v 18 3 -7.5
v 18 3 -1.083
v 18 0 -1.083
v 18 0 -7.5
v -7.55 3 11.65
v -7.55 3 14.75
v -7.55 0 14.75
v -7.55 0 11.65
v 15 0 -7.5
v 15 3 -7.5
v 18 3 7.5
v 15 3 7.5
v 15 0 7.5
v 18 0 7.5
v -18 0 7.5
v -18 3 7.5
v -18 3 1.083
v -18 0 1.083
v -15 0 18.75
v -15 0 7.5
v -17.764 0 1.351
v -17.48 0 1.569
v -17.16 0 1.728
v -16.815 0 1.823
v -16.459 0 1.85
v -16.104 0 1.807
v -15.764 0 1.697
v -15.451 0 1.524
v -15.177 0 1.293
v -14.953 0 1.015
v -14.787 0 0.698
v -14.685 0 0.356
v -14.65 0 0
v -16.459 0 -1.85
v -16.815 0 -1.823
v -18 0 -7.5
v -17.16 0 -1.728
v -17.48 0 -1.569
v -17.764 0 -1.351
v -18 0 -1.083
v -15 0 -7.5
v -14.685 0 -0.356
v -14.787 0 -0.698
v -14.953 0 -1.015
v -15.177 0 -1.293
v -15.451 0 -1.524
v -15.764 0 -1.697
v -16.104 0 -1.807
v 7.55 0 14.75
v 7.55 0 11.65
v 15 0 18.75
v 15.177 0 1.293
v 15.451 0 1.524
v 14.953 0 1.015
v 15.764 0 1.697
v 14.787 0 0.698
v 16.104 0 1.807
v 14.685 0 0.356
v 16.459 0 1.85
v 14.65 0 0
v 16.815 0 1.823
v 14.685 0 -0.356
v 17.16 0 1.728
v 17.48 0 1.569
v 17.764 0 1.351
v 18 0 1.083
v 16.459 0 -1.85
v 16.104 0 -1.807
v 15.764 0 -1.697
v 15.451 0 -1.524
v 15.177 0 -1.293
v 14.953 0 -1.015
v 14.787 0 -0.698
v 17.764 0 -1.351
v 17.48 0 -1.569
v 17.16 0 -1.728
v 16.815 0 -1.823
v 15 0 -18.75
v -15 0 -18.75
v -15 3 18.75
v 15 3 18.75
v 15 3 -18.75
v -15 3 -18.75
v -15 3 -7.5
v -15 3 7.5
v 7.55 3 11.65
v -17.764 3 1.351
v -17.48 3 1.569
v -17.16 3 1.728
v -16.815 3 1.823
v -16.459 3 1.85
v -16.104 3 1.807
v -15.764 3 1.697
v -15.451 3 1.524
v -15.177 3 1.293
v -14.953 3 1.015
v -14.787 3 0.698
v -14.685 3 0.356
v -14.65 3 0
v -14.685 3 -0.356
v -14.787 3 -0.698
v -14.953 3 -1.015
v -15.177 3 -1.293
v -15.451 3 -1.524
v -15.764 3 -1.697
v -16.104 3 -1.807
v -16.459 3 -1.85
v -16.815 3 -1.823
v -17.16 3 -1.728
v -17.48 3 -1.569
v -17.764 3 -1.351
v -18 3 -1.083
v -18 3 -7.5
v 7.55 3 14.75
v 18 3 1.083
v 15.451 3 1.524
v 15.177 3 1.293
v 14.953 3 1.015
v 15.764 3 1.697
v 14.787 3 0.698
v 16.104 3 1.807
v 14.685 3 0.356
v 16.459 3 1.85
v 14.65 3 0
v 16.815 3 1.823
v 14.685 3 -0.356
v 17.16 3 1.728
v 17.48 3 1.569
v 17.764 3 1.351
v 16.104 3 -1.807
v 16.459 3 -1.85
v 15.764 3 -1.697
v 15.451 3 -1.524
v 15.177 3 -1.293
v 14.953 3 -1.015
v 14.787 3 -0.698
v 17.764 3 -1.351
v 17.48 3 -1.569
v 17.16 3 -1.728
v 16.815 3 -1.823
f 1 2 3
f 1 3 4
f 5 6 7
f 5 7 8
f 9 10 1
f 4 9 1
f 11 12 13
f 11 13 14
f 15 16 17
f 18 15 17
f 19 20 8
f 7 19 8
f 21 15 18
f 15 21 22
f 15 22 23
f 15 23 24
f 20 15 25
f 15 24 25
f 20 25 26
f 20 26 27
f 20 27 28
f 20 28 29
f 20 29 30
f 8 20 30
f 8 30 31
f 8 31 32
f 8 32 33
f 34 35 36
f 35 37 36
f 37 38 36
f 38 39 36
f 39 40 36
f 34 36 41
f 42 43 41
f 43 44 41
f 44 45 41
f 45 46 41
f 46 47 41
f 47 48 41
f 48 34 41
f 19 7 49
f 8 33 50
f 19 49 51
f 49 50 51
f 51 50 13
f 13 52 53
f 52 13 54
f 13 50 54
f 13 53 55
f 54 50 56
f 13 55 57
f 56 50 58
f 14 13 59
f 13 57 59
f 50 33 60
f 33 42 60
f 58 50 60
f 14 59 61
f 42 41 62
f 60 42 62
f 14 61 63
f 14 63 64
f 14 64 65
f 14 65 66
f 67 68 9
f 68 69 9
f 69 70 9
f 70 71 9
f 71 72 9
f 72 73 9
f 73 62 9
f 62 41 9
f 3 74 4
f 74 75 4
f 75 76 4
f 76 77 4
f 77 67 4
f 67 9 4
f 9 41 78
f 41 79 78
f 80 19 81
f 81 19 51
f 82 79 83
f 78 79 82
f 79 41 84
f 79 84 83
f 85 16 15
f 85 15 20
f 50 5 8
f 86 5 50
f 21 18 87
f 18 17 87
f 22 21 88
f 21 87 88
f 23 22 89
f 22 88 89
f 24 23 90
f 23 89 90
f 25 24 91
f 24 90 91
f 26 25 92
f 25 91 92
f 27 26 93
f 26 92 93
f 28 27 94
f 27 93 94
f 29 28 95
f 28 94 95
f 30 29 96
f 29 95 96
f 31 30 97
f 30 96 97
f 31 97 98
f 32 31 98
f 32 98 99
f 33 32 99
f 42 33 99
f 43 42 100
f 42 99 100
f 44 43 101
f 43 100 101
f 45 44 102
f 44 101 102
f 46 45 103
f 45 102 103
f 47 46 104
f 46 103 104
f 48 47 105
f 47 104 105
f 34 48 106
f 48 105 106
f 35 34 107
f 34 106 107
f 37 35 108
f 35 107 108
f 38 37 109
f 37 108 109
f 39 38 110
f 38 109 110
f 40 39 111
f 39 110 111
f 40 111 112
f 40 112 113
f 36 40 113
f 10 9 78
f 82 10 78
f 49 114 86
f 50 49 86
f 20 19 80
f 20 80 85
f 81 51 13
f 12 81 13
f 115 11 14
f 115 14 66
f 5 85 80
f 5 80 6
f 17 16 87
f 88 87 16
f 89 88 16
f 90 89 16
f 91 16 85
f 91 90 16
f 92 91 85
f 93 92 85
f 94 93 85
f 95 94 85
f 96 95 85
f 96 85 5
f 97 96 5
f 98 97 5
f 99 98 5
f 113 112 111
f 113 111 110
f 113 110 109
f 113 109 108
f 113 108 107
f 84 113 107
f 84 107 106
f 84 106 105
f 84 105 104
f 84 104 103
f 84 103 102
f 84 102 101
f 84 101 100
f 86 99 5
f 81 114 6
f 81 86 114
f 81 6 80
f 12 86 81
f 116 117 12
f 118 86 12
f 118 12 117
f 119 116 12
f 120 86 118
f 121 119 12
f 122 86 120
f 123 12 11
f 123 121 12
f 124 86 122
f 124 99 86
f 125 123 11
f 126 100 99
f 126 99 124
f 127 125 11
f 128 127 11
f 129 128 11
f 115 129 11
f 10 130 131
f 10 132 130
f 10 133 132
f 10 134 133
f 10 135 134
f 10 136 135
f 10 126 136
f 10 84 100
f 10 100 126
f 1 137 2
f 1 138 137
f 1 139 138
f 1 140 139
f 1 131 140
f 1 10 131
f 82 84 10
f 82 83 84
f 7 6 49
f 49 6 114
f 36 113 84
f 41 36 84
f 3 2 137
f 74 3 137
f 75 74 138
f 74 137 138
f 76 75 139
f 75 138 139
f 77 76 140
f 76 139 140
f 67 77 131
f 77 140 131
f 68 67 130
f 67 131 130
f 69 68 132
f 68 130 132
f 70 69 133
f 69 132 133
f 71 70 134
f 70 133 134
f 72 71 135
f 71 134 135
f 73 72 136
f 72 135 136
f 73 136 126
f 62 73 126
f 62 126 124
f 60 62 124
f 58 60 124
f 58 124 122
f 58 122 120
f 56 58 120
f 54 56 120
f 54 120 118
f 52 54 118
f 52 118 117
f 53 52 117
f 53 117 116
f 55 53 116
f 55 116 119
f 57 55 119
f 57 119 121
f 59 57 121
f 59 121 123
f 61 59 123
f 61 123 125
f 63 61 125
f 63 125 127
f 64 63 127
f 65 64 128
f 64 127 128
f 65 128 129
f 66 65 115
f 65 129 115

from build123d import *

# Parameters (mm, degrees)
SKETCH1_W           = 30
SKETCH1_H           = 37.5
BOSS_EXTRUDE1_DEPTH = 3
SKETCH2_W           = 3
SKETCH2_H           = 15
BOSS_EXTRUDE2_DEPTH = 3
SKETCH3_R           = 1.85
CUT_EXTRUDE1_DEPTH  = 27.164145314
SKETCH4_W           = 15.1
SKETCH4_H           = 3.1
CUT_EXTRUDE2_DEPTH  = 27.164145314


with BuildPart() as part:
    # Sketch1 → Boss-Extrude1 (new body)
    with BuildSketch(Plane(origin=(0, 0, 0), x_dir=(1, 0, 0), z_dir=(0, 1, 0))):
        Rectangle(SKETCH1_W, SKETCH1_H)
    extrude(amount=BOSS_EXTRUDE1_DEPTH)

    # Sketch2 → Boss-Extrude2 (add)
    with BuildSketch(Plane(origin=(0, 3, 0), x_dir=(1, 0, 0), z_dir=(0, 1, 0))):
        with Locations((-16.5, 0)):
            Rectangle(SKETCH2_W, SKETCH2_H)
        with Locations((16.5, 0)):
            Rectangle(SKETCH2_W, SKETCH2_H)
    extrude(amount=-BOSS_EXTRUDE2_DEPTH)

    # Sketch3 → Cut-Extrude1 (cut, through all)
    with BuildSketch(Plane(origin=(0, 3, 0), x_dir=(1, 0, 0), z_dir=(0, 1, 0))):
        with Locations((-16.5, 0)):
            Circle(SKETCH3_R)
        with Locations((16.5, 0)):
            Circle(SKETCH3_R)
    extrude(amount=-CUT_EXTRUDE1_DEPTH, mode=Mode.SUBTRACT)

    # Sketch4 → Cut-Extrude2 (cut, through all)
    with BuildSketch(Plane(origin=(0, 3, 0), x_dir=(1, 0, 0), z_dir=(0, 1, 0))):
        with Locations((0, -13.2)):
            Rectangle(SKETCH4_W, SKETCH4_H)
    extrude(amount=-CUT_EXTRUDE2_DEPTH, mode=Mode.SUBTRACT)


solid = part.part
